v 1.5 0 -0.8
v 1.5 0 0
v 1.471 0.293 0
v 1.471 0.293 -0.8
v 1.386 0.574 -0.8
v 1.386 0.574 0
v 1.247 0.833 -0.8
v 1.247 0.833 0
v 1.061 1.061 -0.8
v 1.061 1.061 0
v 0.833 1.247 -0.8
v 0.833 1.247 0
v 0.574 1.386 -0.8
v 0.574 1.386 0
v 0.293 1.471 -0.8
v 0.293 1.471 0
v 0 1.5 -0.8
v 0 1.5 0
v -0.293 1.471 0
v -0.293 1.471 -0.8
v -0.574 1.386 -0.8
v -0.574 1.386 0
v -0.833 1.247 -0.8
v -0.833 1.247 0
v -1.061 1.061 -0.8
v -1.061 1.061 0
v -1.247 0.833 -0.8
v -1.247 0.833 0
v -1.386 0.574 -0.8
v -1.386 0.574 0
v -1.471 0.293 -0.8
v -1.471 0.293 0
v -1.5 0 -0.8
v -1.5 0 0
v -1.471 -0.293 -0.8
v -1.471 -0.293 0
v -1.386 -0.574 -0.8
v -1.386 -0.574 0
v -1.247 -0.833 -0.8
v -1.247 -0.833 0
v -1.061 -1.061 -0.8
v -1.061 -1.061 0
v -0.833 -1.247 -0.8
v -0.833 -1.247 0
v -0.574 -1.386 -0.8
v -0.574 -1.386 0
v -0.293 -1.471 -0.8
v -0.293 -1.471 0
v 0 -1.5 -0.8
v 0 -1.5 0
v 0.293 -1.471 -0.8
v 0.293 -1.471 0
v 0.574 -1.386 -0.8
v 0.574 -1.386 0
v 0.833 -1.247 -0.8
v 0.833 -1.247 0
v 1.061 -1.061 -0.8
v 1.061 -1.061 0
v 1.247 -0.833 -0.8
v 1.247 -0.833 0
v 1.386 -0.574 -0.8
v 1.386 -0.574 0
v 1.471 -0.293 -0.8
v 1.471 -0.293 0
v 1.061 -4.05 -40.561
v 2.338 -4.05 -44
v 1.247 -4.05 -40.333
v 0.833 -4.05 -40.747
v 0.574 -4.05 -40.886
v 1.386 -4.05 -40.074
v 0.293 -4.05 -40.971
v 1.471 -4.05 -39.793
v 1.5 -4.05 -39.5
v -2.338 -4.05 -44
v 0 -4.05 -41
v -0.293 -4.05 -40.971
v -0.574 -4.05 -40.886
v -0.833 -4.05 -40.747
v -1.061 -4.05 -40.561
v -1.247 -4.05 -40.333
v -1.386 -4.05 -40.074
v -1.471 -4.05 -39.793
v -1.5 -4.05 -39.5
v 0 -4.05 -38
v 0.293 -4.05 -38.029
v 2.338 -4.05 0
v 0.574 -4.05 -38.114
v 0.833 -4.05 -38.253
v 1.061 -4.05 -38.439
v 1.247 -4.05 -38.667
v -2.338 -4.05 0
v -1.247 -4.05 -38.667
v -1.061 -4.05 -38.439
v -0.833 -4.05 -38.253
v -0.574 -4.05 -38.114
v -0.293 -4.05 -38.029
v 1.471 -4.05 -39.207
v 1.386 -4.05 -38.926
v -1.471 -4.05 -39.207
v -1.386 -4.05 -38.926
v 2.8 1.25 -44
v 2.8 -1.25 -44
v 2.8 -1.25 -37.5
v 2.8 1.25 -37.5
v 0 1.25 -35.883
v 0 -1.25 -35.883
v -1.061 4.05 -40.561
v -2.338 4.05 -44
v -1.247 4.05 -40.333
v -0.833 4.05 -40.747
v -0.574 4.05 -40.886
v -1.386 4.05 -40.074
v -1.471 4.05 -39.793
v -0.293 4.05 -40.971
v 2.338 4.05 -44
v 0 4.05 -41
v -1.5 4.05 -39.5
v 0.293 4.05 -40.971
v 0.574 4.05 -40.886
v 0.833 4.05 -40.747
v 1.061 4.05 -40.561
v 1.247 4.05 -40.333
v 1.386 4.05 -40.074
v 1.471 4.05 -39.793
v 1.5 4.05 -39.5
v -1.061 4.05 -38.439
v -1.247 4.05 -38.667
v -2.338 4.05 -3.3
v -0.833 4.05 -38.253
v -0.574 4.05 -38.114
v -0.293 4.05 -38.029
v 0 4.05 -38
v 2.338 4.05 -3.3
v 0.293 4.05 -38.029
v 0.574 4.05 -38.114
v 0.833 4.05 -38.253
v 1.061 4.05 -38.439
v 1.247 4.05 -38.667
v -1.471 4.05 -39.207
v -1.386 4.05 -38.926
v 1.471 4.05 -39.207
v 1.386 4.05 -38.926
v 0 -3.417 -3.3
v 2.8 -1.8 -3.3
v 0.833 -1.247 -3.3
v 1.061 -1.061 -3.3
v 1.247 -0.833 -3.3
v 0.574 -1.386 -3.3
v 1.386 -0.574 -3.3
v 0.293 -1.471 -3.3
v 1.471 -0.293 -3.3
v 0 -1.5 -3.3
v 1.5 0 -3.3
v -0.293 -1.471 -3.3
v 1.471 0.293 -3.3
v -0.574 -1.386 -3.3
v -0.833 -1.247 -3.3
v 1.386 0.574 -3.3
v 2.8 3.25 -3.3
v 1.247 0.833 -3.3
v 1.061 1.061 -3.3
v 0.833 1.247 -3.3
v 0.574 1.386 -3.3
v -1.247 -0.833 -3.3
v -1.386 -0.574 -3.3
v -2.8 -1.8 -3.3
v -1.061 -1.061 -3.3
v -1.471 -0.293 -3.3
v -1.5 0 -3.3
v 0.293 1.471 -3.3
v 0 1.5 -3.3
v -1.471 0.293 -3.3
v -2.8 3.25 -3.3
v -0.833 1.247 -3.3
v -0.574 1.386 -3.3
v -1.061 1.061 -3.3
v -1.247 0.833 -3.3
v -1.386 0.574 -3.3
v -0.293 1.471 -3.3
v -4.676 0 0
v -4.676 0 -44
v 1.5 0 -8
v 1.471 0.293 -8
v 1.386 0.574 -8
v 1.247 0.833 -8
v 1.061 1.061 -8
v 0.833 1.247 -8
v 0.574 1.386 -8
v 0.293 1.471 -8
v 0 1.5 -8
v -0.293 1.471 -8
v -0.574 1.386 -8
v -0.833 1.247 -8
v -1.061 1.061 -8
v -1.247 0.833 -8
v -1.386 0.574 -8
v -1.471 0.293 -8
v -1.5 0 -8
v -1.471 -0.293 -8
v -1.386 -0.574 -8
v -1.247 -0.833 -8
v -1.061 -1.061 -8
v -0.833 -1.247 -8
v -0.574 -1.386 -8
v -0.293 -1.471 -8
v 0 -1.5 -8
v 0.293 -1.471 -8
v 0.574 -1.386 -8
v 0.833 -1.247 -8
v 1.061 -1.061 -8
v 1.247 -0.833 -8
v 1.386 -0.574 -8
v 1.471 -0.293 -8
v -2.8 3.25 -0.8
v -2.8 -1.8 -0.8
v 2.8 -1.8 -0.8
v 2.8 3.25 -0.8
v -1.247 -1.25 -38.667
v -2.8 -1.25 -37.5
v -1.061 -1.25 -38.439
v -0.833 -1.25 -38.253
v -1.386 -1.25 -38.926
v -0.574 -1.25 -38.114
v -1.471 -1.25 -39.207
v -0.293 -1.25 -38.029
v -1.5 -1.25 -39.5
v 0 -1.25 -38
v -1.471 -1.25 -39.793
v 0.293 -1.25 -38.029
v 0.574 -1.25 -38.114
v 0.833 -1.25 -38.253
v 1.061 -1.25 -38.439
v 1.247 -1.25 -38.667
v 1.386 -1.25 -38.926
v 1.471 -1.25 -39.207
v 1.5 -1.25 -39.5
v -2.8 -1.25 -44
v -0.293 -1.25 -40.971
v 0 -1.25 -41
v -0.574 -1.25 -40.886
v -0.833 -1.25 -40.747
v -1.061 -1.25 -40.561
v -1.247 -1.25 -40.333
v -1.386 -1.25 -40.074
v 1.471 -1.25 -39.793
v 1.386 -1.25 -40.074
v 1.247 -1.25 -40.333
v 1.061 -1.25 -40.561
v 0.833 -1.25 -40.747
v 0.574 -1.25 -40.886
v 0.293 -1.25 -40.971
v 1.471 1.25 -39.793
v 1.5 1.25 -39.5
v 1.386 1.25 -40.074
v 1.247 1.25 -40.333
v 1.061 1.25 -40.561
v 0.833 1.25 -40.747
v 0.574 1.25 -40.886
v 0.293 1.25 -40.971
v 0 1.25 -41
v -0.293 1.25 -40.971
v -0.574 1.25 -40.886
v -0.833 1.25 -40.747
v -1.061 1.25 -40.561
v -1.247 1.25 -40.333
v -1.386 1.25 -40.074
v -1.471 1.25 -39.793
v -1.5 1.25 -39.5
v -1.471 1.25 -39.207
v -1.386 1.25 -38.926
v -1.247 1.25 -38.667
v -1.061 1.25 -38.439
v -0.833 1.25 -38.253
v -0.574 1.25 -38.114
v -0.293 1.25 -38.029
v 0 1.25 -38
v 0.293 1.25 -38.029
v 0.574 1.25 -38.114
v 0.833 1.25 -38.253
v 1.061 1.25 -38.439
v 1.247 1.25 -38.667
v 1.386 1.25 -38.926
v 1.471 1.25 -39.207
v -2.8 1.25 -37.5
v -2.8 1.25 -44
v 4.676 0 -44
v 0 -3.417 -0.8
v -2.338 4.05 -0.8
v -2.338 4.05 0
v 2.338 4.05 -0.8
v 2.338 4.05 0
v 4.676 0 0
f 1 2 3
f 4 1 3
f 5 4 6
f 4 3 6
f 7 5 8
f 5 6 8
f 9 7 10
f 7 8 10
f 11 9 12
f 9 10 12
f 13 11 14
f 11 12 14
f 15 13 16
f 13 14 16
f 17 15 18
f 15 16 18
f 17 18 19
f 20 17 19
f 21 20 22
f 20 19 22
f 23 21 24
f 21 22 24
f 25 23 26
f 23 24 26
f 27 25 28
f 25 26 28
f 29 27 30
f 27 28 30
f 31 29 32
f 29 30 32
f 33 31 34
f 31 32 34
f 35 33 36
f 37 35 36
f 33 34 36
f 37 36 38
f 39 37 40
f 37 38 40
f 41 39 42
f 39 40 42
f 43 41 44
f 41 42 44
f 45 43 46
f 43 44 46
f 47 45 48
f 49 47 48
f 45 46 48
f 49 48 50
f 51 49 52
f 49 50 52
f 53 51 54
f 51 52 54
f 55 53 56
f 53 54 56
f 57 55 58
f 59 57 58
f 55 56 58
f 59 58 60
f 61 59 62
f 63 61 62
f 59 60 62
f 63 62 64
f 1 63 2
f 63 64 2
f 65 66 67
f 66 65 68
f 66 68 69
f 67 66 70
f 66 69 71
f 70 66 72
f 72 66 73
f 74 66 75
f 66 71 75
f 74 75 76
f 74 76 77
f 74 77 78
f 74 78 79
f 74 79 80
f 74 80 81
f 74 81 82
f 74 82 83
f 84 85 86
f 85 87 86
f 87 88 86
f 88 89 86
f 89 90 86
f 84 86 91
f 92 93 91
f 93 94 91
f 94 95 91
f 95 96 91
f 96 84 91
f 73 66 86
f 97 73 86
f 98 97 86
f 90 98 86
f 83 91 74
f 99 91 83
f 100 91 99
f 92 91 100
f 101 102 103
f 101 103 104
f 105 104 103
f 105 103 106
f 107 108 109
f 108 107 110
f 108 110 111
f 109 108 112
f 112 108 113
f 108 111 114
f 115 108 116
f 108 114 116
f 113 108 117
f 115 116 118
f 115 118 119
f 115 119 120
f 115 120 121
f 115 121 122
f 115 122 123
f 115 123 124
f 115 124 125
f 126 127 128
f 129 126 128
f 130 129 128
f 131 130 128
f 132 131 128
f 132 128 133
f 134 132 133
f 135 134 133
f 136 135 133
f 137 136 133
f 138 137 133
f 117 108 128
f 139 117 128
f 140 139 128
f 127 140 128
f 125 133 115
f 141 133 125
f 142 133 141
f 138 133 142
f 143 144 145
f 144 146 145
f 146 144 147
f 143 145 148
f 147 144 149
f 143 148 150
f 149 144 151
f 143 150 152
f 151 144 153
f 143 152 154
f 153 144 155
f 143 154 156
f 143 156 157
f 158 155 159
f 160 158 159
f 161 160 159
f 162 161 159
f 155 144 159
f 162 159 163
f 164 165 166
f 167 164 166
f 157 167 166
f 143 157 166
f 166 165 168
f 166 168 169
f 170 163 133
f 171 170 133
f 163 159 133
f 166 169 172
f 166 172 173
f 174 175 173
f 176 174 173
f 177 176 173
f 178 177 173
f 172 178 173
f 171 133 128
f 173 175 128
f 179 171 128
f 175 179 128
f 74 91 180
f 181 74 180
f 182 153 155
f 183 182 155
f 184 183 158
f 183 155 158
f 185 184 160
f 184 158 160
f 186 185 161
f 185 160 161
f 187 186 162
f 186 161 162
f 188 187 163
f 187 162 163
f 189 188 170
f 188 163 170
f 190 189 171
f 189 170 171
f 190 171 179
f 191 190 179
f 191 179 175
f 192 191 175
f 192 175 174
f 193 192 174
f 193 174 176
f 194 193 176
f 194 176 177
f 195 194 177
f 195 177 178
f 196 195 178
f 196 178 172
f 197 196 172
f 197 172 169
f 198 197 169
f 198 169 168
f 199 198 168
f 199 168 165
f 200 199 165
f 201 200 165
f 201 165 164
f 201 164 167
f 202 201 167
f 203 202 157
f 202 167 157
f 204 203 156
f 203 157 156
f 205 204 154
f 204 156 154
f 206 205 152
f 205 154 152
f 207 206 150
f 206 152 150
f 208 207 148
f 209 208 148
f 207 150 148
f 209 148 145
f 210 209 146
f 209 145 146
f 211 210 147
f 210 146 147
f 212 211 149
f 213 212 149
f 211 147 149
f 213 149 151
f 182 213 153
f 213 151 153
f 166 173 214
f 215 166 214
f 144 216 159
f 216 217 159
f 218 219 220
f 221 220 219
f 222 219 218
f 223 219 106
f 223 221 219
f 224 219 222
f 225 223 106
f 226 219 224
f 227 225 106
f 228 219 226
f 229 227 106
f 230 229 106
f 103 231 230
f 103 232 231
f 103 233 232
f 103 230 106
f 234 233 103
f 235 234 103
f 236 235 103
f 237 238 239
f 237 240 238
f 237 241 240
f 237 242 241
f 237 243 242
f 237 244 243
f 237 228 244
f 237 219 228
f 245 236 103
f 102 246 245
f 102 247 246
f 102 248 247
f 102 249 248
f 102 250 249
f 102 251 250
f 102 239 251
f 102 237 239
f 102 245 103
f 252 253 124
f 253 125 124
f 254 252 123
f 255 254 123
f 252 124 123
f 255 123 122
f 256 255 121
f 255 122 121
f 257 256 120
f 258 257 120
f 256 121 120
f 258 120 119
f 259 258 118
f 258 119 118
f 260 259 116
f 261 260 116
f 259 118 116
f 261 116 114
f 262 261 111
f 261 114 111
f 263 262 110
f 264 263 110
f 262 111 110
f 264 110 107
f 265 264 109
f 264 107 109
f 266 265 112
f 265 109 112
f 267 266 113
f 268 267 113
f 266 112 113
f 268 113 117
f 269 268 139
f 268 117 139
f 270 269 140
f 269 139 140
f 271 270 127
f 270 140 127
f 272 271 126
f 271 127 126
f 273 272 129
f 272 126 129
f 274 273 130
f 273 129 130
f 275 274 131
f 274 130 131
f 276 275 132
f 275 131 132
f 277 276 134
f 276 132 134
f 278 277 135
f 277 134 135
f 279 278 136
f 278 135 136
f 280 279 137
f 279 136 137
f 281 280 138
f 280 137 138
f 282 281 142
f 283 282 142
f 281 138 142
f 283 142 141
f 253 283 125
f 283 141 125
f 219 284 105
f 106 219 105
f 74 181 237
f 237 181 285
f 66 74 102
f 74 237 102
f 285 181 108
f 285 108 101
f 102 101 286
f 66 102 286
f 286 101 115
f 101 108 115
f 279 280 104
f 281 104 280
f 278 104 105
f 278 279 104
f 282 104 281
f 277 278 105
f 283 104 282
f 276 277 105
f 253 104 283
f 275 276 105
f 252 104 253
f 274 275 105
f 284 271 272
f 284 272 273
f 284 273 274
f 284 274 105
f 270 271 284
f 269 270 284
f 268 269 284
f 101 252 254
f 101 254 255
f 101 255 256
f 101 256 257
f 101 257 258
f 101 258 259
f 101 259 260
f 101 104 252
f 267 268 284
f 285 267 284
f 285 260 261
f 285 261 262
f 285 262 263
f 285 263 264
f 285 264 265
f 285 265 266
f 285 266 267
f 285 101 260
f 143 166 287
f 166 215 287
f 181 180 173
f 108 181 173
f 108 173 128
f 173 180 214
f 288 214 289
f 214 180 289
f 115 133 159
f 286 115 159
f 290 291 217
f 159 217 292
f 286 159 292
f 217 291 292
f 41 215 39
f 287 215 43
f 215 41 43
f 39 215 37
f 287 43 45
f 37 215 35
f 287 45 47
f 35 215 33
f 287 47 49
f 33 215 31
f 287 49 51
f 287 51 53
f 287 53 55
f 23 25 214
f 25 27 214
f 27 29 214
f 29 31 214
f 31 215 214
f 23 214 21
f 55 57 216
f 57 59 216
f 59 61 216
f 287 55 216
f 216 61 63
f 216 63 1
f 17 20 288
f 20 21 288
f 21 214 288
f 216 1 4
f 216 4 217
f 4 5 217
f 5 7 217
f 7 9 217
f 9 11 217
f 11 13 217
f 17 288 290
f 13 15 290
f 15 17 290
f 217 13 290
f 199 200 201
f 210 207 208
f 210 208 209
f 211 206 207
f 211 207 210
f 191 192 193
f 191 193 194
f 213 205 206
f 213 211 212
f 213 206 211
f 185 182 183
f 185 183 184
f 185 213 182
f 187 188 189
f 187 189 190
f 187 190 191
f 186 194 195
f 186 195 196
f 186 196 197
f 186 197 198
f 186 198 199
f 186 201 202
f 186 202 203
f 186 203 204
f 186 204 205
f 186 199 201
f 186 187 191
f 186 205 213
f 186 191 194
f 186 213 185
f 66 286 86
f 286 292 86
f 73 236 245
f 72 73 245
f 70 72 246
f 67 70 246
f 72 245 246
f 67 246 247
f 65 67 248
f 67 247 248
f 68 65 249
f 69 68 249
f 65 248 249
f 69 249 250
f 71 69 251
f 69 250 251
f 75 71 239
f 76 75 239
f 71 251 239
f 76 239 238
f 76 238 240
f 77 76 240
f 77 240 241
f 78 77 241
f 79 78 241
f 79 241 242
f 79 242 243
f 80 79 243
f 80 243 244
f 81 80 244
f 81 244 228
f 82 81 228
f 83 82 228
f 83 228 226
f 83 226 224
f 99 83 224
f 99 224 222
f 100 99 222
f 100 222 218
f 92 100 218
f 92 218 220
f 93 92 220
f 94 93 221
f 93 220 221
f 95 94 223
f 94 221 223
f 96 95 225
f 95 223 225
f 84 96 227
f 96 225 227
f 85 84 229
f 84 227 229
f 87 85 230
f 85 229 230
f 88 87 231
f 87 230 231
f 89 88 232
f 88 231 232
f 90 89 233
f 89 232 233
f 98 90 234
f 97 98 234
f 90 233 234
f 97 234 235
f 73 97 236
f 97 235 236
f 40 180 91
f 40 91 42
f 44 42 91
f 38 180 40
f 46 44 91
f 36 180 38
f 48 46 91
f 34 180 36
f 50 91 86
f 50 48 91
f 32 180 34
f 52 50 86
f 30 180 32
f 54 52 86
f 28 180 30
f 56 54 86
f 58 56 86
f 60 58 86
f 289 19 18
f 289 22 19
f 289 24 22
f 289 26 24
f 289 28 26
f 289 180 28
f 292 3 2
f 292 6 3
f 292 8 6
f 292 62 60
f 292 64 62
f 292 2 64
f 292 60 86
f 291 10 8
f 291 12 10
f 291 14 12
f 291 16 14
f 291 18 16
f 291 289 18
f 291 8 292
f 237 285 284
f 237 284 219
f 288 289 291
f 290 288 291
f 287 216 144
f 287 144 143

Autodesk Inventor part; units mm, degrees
ref_plane "YZ Plane" through (0, 0, 0) normal (1, 0, 0) x (0, 1, 0)
ref_plane "XZ Plane" through (0, 0, 0) normal (0, 1, 0) x (-1, 0, 0)
sketch "Sketch1" plane through (0, 0, 0) normal (0, 0, 1) x (1, 0, 0)
  line L0 (-2.3383, -4.05) -> (-4.6765, 0)
  line L1 (-4.6765, 0) -> (-2.3383, 4.05)
  line L2 (-2.3383, 4.05) -> (2.3383, 4.05)
  line L3 (2.3383, 4.05) -> (4.6765, 0)
  line L4 (4.6765, 0) -> (2.3383, -4.05)
  line L5 (2.3383, -4.05) -> (-2.3383, -4.05)
  point P0 (0, 0)
  point P1 (0, 0)
  dimension "d0" = 4.05
extrude "Extrusion1" add sketch "Sketch1" against normal blind 44
sketch "Sketch2" plane through (4.6765, 0, 0) normal (0.866, 0.5, 0) x (0, 0, -1)
  line L0 (0, 4.6765) -> (0, 0) projected
  line L1 (4.75, 5.1383) -> (7.25, 5.1383)
  line L2 (7.25, 5.1383) -> (7.25, -0.4617)
  line L3 (7.25, -0.4617) -> (4.75, -0.4617)
  line L4 (4.75, -0.4617) -> (4.75, 5.1383)
  line L5 (4.75, 5.1383) -> (7.25, -0.4617) construction
  line L6 (7.25, 5.1383) -> (4.75, -0.4617) construction
  point P0 (0, 2.3383)
  point P1 (6, 2.3383)
  dimension "d3" = 2.5
  dimension "d4" = 5.6
  dimension "d10" = 0
  dimension "d11" = 6
extrude "Extrusion2" [suppressed]
sketch "Sketch3" plane through (0, 0, 0) normal (0, 0, 1) x (1, 0, 0)
  circle A0 centre (0, 0) radius 1.5
  dimension "d7" = 3
extrude "Extrusion3" cut sketch "Sketch3" against normal blind 8
ref_plane "Work Plane1" through (0, 0, -22) normal (0, 0, -1) x (-1, 0, 0)
mirror "Mirror1" [suppressed]
sketch "Sketch4" plane through (1.5014, 4.1, -7.25) normal (0, 0, 1) x (1, 0, 0)
  line L0 (0, 0) -> (-4.5469, -2.6251) projected
  line L1 (-1.7469, -7.4749) -> (-4.5469, -2.6251) projected
  line L2 (2.8, -4.8497) -> (-1.7469, -7.4749) projected
  line L3 (-4.5469, -2.6251) -> (-4.5469, -5.8583)
  line L4 (-1.7469, -7.4749) -> (-4.5469, -5.8583)
  line L5 (-1.7469, -7.4749) -> (-4.5469, -2.6251)
  point P0 (-1.5014, -4.1)
  dimension "d12" = 120
  dimension "d13" = 120
extrude "Extrusion4" [suppressed]
sketch "Sketch5" plane through (-4.6765, 0, -44) normal (-0.866, -0.5, 0) x (0, 0, 1)
  line L0 (0, -4.6765) -> (0, 0) projected
  line L1 (4.75, 0.5197) -> (7.25, 0.5197)
  line L2 (7.25, 0.5197) -> (7.25, -5.0803)
  line L3 (7.25, -5.0803) -> (4.75, -5.0803)
  line L4 (4.75, -5.0803) -> (4.75, 0.5197)
  line L5 (4.75, 0.5197) -> (7.25, -5.0803) construction
  line L6 (7.25, 0.5197) -> (4.75, -5.0803) construction
  line L7 (0, -3.8671) -> (0, -0.8671) projected
  line L8 (0, -4.6765) -> (0, 0) projected
  line L9 (0, 0) -> (0, 2.3383) projected
  line L10 (0, 2.3383) -> (0, 0) projected
  line L11 (0, 0) -> (0, -4.6765) projected
  line L12 (0, -4.6765) -> (0, -7.0148) projected
  line L13 (0, -7.0148) -> (0, -4.6765) projected
  line L14 (9.5, -0.8671) -> (9.5, -3.8671) projected
  line L15 (0, -3.8671) -> (0, -0.8671) projected
  line L16 (44, -7.0148) -> (0, -7.0148) projected
  line L17 (44, 2.3383) -> (0, 2.3383) projected
  point P0 (44, -2.3383)
  point P1 (6, -2.2803)
  dimension "d16" = 2.5
  dimension "d17" = 5.6
  dimension "d18" = 6
  dimension "d25" = 1.9345
extrude "Extrusion5" [suppressed]
sketch "Sketch6" plane through (-1.5019, -4.1, -42.75) normal (0, 0, -1) x (-1, 0, 0)
  line L0 (-1.7472, 7.4751) -> (-4.5472, 2.6253) projected
  line L1 (-4.5472, 2.6253) -> (-4.5472, 5.8585)
  line L2 (-1.7472, 7.4751) -> (-4.5472, 5.8585)
  line L3 (2.7993, 4.8501) -> (-1.7472, 7.4751) projected
  line L4 (0, 0) -> (-4.5472, 2.6253) projected
  line L5 (-1.7472, 7.4751) -> (-4.5472, 2.6253)
  point P0 (-1.5019, 4.1)
  dimension "d21" = 120
  dimension "d22" = 120
extrude "Extrusion6" [suppressed]
sketch "Sketch8" plane through (0, 0, -44) normal (0, 0, -1) x (-1, 0, 0)
  line L0 (-2.8, 1.25) -> (2.8, 1.25)
  line L1 (2.8, 1.25) -> (2.8, -1.25)
  line L2 (2.8, -1.25) -> (-2.8, -1.25)
  line L3 (-2.8, -1.25) -> (-2.8, 1.25)
  circle A0 centre (0, 0) radius 1.5 projected
  line L4 (-2.8, 1.25) -> (2.8, -1.25) construction
  line L5 (2.8, 1.25) -> (-2.8, -1.25) construction
  dimension "d32" = 5.6
  dimension "d33" = 2.5
extrude "Extrusion8" cut sketch "Sketch8" against normal blind 6.5 contours L0 A0 L2 L3 | L0 A0 L2 | L0 L1 L2 A0
sketch "Sketch9" plane through (-2.3383, 4.05, 0) normal (0, 1, 0) x (1, 0, 0)
  line L0 (4.6765, 0) -> (4.6765, 44) projected
  line L1 (0, 44) -> (4.6765, 44) projected
  line L2 (0, 0) -> (0, 44) projected
  line L3 (0, 0) -> (4.6765, 0) projected
  line L4 (5.1383, 44) -> (-0.4617, 44) projected
  line L5 (2.3383, 44) -> (2.3383, 0) construction
  line L6 (2.3383, 44) -> (46.3383, 44) construction
  circle A0 centre (2.3383, 39.5) radius 1.5
  dimension "d36" = 90
  dimension "d37" = 3
  dimension "d38" = 0
  dimension "d39" = 4.5
extrude "Extrusion9" cut sketch "Sketch9" against normal up to surface (8.1 mm away) contours A0
sketch "Sketch10" plane through (-2.8, 1.25, -44) normal (0, -1, 0) x (1, 0, 0)
  circle A0 centre (2.8, 4.5) radius 1.5 projected
  line L0 (5.6, 0) -> (0, 0) projected
  line L1 (5.6, 0) -> (5.6, 6.5) projected
  line L2 (5.6, 6.5) -> (0, 6.5) projected
  line L3 (0, 0) -> (0, 6.5) projected
  line L4 (0, 6.5) -> (2.8, 8.1166)
  line L5 (0, 6.5) -> (3.9156, 6.5) construction
  line L6 (5.6, 6.5) -> (2.8, 8.1166)
  line L7 (5.6, 6.5) -> (8.8332, 6.5) construction
  line L8 (5.6, 6.5) -> (0, 6.5)
  point P0 (2.8, 44)
  dimension "d42" = 30
  dimension "d43" = 150
extrude "Extrusion10" cut sketch "Sketch10" along normal blind 2.5 contours L2 L4 L6
sketch "Sketch11" plane through (-2.3383, 4.05, 0) normal (0, 1, 0) x (1, 0, 0)
  circle A0 centre (2.3383, 39.5) radius 1.5 projected
  line L0 (0, 0) -> (4.6765, 0) projected
  line L1 (4.6765, 0) -> (4.6765, 44) projected
  line L2 (0, 44) -> (4.6765, 44) projected
  line L3 (0, 0) -> (0, 44) projected
  line L4 (-0.4617, 0.8) -> (5.1383, 0.8)
  line L5 (5.1383, 0.8) -> (5.1383, 3.3)
  line L6 (5.1383, 3.3) -> (-0.4617, 3.3)
  line L7 (-0.4617, 3.3) -> (-0.4617, 0.8)
  line L8 (-0.4617, 0.8) -> (5.1383, 3.3) construction
  line L9 (5.1383, 0.8) -> (-0.4617, 3.3) construction
  point P0 (2.3383, 0)
  point P1 (2.3383, 2.05)
  dimension "d46" = 5.6
  dimension "d47" = 2.5
  dimension "d48" = 2.05
extrude "Extrusion11" cut sketch "Sketch11" against normal blind 5.85 contours L4 L7 L6 L3 | L3 L6 L1 L4 | L1 L6 L5 L4
sketch "Sketch12" plane through (2.3383, 4.05, -0.8) normal (0, 0, -1) x (-1, 0, 0)
  line L0 (5.1383, -0.7997) -> (4.6765, 0) projected
  line L1 (5.1383, -0.7997) -> (5.1383, -5.85) projected
  line L2 (5.1383, -5.85) -> (-0.4617, -5.85) projected
  line L3 (-0.4617, -0.7997) -> (-0.4617, -5.85) projected
  line L4 (0, 0) -> (-0.4617, -0.7997) projected
  line L5 (4.6765, 0) -> (0, 0) projected
  circle A0 centre (2.3383, -4.05) radius 1.5 projected
  line L6 (5.1383, -5.85) -> (2.3383, -7.4666)
  line L7 (5.1383, -5.85) -> (8.4476, -5.85) construction
  line L8 (-0.4617, -5.85) -> (2.3383, -7.4666)
  line L9 (-0.4617, -5.85) -> (2.7714, -5.85) construction
  dimension "d52" = 150
  dimension "d53" = 30
extrude "Extrusion12" cut sketch "Sketch12" along normal up to surface (2.5 mm away) contours L6 L8 L2
properties part number "SupportSecondToCoverNew" material "ABS Plastic"
